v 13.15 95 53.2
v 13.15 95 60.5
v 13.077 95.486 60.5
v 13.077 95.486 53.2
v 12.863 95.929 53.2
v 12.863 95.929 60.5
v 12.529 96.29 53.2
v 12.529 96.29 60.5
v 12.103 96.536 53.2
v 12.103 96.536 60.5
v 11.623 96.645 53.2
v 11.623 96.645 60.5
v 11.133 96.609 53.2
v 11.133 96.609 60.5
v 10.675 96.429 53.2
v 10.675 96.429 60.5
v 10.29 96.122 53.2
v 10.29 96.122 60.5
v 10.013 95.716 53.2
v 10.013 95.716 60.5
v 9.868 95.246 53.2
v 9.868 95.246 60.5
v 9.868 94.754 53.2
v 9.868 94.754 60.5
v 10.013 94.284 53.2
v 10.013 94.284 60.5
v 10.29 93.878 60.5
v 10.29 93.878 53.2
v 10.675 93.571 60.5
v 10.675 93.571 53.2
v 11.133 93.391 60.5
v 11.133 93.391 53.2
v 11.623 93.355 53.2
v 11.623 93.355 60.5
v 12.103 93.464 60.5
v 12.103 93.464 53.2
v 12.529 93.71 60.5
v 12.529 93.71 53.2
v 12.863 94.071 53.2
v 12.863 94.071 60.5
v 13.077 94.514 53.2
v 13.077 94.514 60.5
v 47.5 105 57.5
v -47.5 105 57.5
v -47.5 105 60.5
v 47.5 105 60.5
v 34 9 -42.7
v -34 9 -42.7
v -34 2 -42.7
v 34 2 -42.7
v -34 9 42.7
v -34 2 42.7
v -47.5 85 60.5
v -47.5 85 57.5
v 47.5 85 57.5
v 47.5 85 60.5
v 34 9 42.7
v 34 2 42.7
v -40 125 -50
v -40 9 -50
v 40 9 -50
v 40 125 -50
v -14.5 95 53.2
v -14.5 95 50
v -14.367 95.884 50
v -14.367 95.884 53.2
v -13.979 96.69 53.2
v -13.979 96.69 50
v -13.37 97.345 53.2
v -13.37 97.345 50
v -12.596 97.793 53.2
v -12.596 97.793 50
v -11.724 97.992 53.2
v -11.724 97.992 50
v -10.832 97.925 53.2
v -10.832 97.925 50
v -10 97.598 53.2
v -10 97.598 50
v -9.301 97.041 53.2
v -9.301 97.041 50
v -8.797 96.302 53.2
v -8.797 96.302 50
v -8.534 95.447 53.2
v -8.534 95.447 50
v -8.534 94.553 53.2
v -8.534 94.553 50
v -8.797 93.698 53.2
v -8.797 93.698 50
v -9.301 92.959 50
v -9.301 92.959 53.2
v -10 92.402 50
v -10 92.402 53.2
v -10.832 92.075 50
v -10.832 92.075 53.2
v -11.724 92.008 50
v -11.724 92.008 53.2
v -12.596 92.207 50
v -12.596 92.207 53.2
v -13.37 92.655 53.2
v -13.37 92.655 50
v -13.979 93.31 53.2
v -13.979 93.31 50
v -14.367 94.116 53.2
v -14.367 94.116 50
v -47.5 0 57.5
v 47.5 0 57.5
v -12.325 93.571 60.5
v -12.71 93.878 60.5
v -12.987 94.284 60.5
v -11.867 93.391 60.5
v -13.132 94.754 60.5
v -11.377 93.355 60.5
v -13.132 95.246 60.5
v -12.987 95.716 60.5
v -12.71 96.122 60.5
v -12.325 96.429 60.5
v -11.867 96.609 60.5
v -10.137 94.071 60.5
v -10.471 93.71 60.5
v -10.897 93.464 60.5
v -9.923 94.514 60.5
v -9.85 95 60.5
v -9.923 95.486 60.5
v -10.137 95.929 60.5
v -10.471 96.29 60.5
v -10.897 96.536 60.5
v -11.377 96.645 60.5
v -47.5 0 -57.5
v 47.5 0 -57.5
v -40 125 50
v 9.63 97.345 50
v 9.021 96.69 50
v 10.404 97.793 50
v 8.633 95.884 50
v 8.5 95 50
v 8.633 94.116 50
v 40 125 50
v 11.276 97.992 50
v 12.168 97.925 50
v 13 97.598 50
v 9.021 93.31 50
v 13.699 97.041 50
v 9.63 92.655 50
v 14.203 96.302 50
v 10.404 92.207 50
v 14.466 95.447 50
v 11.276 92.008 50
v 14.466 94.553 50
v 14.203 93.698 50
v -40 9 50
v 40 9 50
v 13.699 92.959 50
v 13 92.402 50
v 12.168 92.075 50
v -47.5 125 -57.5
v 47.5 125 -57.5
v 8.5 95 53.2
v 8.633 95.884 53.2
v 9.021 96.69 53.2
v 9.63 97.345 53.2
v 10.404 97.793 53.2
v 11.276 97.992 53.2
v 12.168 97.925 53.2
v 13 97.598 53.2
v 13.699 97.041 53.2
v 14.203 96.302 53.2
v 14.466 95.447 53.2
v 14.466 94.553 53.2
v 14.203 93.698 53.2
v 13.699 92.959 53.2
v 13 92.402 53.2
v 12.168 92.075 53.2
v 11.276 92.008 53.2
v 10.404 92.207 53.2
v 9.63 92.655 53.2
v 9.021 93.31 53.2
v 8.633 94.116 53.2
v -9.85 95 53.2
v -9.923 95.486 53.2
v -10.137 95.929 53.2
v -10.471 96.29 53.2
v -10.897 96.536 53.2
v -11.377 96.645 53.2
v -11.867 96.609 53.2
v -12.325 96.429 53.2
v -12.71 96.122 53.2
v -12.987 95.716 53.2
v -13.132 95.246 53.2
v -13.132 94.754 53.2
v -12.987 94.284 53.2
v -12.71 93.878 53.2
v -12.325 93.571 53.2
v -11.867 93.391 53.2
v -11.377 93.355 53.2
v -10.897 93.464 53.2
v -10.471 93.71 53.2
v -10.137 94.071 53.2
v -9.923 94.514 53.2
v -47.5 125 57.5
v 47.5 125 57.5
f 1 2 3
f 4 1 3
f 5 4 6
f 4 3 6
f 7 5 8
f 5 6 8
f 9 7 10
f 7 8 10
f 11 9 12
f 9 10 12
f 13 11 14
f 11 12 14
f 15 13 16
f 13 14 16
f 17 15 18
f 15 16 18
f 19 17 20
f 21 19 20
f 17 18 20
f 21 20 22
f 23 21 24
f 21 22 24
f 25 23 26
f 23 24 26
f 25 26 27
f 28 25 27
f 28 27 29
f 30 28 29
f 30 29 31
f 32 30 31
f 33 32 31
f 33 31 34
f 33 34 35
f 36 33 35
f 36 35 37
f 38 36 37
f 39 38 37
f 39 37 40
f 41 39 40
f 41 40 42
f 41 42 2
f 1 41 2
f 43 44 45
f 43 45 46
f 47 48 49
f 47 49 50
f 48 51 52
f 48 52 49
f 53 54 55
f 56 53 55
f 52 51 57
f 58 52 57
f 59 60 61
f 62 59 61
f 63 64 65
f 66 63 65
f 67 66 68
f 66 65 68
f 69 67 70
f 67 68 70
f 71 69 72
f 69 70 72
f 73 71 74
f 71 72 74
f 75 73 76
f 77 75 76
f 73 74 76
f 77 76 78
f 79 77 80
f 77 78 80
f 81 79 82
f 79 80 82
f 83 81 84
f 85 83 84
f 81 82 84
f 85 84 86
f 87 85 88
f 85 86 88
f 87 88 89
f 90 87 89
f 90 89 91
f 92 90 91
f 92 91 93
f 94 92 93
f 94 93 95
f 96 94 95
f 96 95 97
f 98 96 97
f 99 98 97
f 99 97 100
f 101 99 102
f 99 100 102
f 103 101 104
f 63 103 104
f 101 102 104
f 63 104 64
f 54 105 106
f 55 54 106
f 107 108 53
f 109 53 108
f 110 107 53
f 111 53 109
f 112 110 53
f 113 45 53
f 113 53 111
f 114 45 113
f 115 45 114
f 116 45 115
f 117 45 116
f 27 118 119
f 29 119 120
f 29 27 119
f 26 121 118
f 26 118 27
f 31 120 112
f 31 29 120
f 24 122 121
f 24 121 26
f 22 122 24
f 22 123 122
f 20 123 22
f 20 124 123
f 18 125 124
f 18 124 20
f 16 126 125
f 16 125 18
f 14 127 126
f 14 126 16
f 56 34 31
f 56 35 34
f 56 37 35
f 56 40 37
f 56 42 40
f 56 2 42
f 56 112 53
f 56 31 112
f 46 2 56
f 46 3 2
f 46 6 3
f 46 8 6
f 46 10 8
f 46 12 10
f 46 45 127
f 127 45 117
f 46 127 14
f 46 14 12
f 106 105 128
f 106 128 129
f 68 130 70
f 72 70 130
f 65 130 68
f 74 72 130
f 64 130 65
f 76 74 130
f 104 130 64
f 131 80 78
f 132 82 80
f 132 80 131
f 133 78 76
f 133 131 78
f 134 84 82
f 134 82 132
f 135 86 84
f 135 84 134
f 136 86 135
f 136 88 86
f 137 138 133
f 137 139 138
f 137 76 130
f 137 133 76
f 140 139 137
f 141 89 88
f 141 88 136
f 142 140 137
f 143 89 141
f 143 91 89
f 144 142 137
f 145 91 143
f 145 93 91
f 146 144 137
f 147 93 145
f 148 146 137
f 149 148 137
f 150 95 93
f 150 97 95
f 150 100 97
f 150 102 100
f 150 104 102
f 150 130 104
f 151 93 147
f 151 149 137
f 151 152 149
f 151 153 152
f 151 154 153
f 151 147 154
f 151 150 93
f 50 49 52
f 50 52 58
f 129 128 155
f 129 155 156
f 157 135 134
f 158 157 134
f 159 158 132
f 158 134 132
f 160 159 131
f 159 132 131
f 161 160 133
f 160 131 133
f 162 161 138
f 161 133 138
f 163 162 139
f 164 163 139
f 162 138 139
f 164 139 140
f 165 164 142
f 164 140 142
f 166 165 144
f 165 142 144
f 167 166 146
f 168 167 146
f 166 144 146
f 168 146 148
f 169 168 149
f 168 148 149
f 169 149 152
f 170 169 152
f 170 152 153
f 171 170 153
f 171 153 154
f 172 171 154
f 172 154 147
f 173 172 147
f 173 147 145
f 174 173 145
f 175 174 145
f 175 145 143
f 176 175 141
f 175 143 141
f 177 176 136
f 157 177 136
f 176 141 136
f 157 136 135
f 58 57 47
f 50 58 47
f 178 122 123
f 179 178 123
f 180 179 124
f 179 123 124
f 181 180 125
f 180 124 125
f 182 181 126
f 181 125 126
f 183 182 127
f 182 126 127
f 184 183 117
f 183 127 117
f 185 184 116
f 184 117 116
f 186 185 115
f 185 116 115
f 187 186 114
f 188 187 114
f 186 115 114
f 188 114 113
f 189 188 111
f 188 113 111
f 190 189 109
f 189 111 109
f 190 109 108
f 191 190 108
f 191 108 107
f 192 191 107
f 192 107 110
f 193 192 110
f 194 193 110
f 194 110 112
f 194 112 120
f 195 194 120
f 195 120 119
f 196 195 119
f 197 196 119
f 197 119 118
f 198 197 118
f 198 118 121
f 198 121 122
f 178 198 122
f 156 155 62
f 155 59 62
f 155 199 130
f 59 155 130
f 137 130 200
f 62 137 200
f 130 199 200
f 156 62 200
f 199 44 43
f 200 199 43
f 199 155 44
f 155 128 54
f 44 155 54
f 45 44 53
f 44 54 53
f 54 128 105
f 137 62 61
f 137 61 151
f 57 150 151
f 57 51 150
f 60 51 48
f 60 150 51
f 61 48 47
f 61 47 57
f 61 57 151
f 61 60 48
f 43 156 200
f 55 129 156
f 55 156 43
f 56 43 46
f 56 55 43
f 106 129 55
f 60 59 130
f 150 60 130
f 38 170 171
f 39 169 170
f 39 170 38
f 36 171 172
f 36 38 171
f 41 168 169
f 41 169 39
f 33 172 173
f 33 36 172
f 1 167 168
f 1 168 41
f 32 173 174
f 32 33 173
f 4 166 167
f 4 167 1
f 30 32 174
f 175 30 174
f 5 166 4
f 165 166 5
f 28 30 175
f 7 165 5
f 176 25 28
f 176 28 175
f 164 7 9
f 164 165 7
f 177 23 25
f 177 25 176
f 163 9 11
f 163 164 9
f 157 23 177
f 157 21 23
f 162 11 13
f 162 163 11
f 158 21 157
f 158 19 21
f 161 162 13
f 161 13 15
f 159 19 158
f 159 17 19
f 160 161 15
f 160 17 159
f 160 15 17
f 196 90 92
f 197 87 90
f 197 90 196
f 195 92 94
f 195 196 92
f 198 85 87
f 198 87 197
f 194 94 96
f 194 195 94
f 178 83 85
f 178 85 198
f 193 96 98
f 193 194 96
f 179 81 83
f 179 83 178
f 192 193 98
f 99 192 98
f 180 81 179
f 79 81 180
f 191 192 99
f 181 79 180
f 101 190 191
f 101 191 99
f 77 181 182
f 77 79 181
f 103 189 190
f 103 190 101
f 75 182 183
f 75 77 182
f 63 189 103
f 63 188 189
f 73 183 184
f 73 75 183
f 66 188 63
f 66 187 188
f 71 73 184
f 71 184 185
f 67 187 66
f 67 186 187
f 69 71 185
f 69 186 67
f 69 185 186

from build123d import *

# Parameters (mm, degrees)
SKETCH1_W           = 80
SKETCH1_H           = 100
BOSS_EXTRUDE1_DEPTH = 9
SKETCH2_W           = 68
SKETCH2_H           = 85.4
CUT_EXTRUDE1_DEPTH  = 7
SKETCH3_W           = 95
SKETCH3_H           = 115
SKETCH3_W_2         = 80
SKETCH3_H_2         = 100
BOSS_EXTRUDE2_DEPTH = 125
SKETCH6_W           = 95
SKETCH6_H           = 20
BOSS_EXTRUDE4_DEPTH = 3
SKETCH7_R           = 1.65
CUT_EXTRUDE2_DEPTH  = 10.5
SKETCH9_R           = 3
CUT_EXTRUDE3_DEPTH  = 3.2


with BuildPart() as part:
    # Sketch1 → Boss-Extrude1 (new body)
    with BuildSketch(Plane(origin=(0, 0, 0), x_dir=(1, 0, 0), z_dir=(0, 1, 0))):
        Rectangle(SKETCH1_W, SKETCH1_H)
    extrude(amount=BOSS_EXTRUDE1_DEPTH)

    # Sketch2 → Cut-Extrude1 (cut)
    with BuildSketch(Plane(origin=(0, 9, 0), x_dir=(1, 0, 0), z_dir=(0, 1, 0))):
        Rectangle(SKETCH2_W, SKETCH2_H)
    extrude(amount=-CUT_EXTRUDE1_DEPTH, mode=Mode.SUBTRACT)

    # Sketch3 → Boss-Extrude2 (add)
    with BuildSketch(Plane.XZ):
        Rectangle(SKETCH3_W, SKETCH3_H)
        Rectangle(SKETCH3_W_2, SKETCH3_H_2, mode=Mode.SUBTRACT)
    extrude(amount=-BOSS_EXTRUDE2_DEPTH)

    # Sketch6 → Boss-Extrude4 (add)
    with BuildSketch(Plane.XY.offset(57.5)):
        with Locations((0, 95)):
            Rectangle(SKETCH6_W, SKETCH6_H)
    extrude(amount=BOSS_EXTRUDE4_DEPTH)

    # Sketch7 → Cut-Extrude2 (cut)
    with BuildSketch(Plane.XY.offset(60.5)):
        with Locations((-11.5, 95)):
            Circle(SKETCH7_R)
        with Locations((11.5, 95)):
            Circle(SKETCH7_R)
    extrude(amount=-CUT_EXTRUDE2_DEPTH, mode=Mode.SUBTRACT)

    # Sketch9 → Cut-Extrude3 (cut)
    with BuildSketch(Plane(origin=(0, 0, 50), x_dir=(-1, 0, 0), z_dir=(0, 0, -1))):
        with Locations((-11.5, 95)):
            Circle(SKETCH9_R)
        with Locations((11.5, 95)):
            Circle(SKETCH9_R)
    extrude(amount=-CUT_EXTRUDE3_DEPTH, mode=Mode.SUBTRACT)


solid = part.part
